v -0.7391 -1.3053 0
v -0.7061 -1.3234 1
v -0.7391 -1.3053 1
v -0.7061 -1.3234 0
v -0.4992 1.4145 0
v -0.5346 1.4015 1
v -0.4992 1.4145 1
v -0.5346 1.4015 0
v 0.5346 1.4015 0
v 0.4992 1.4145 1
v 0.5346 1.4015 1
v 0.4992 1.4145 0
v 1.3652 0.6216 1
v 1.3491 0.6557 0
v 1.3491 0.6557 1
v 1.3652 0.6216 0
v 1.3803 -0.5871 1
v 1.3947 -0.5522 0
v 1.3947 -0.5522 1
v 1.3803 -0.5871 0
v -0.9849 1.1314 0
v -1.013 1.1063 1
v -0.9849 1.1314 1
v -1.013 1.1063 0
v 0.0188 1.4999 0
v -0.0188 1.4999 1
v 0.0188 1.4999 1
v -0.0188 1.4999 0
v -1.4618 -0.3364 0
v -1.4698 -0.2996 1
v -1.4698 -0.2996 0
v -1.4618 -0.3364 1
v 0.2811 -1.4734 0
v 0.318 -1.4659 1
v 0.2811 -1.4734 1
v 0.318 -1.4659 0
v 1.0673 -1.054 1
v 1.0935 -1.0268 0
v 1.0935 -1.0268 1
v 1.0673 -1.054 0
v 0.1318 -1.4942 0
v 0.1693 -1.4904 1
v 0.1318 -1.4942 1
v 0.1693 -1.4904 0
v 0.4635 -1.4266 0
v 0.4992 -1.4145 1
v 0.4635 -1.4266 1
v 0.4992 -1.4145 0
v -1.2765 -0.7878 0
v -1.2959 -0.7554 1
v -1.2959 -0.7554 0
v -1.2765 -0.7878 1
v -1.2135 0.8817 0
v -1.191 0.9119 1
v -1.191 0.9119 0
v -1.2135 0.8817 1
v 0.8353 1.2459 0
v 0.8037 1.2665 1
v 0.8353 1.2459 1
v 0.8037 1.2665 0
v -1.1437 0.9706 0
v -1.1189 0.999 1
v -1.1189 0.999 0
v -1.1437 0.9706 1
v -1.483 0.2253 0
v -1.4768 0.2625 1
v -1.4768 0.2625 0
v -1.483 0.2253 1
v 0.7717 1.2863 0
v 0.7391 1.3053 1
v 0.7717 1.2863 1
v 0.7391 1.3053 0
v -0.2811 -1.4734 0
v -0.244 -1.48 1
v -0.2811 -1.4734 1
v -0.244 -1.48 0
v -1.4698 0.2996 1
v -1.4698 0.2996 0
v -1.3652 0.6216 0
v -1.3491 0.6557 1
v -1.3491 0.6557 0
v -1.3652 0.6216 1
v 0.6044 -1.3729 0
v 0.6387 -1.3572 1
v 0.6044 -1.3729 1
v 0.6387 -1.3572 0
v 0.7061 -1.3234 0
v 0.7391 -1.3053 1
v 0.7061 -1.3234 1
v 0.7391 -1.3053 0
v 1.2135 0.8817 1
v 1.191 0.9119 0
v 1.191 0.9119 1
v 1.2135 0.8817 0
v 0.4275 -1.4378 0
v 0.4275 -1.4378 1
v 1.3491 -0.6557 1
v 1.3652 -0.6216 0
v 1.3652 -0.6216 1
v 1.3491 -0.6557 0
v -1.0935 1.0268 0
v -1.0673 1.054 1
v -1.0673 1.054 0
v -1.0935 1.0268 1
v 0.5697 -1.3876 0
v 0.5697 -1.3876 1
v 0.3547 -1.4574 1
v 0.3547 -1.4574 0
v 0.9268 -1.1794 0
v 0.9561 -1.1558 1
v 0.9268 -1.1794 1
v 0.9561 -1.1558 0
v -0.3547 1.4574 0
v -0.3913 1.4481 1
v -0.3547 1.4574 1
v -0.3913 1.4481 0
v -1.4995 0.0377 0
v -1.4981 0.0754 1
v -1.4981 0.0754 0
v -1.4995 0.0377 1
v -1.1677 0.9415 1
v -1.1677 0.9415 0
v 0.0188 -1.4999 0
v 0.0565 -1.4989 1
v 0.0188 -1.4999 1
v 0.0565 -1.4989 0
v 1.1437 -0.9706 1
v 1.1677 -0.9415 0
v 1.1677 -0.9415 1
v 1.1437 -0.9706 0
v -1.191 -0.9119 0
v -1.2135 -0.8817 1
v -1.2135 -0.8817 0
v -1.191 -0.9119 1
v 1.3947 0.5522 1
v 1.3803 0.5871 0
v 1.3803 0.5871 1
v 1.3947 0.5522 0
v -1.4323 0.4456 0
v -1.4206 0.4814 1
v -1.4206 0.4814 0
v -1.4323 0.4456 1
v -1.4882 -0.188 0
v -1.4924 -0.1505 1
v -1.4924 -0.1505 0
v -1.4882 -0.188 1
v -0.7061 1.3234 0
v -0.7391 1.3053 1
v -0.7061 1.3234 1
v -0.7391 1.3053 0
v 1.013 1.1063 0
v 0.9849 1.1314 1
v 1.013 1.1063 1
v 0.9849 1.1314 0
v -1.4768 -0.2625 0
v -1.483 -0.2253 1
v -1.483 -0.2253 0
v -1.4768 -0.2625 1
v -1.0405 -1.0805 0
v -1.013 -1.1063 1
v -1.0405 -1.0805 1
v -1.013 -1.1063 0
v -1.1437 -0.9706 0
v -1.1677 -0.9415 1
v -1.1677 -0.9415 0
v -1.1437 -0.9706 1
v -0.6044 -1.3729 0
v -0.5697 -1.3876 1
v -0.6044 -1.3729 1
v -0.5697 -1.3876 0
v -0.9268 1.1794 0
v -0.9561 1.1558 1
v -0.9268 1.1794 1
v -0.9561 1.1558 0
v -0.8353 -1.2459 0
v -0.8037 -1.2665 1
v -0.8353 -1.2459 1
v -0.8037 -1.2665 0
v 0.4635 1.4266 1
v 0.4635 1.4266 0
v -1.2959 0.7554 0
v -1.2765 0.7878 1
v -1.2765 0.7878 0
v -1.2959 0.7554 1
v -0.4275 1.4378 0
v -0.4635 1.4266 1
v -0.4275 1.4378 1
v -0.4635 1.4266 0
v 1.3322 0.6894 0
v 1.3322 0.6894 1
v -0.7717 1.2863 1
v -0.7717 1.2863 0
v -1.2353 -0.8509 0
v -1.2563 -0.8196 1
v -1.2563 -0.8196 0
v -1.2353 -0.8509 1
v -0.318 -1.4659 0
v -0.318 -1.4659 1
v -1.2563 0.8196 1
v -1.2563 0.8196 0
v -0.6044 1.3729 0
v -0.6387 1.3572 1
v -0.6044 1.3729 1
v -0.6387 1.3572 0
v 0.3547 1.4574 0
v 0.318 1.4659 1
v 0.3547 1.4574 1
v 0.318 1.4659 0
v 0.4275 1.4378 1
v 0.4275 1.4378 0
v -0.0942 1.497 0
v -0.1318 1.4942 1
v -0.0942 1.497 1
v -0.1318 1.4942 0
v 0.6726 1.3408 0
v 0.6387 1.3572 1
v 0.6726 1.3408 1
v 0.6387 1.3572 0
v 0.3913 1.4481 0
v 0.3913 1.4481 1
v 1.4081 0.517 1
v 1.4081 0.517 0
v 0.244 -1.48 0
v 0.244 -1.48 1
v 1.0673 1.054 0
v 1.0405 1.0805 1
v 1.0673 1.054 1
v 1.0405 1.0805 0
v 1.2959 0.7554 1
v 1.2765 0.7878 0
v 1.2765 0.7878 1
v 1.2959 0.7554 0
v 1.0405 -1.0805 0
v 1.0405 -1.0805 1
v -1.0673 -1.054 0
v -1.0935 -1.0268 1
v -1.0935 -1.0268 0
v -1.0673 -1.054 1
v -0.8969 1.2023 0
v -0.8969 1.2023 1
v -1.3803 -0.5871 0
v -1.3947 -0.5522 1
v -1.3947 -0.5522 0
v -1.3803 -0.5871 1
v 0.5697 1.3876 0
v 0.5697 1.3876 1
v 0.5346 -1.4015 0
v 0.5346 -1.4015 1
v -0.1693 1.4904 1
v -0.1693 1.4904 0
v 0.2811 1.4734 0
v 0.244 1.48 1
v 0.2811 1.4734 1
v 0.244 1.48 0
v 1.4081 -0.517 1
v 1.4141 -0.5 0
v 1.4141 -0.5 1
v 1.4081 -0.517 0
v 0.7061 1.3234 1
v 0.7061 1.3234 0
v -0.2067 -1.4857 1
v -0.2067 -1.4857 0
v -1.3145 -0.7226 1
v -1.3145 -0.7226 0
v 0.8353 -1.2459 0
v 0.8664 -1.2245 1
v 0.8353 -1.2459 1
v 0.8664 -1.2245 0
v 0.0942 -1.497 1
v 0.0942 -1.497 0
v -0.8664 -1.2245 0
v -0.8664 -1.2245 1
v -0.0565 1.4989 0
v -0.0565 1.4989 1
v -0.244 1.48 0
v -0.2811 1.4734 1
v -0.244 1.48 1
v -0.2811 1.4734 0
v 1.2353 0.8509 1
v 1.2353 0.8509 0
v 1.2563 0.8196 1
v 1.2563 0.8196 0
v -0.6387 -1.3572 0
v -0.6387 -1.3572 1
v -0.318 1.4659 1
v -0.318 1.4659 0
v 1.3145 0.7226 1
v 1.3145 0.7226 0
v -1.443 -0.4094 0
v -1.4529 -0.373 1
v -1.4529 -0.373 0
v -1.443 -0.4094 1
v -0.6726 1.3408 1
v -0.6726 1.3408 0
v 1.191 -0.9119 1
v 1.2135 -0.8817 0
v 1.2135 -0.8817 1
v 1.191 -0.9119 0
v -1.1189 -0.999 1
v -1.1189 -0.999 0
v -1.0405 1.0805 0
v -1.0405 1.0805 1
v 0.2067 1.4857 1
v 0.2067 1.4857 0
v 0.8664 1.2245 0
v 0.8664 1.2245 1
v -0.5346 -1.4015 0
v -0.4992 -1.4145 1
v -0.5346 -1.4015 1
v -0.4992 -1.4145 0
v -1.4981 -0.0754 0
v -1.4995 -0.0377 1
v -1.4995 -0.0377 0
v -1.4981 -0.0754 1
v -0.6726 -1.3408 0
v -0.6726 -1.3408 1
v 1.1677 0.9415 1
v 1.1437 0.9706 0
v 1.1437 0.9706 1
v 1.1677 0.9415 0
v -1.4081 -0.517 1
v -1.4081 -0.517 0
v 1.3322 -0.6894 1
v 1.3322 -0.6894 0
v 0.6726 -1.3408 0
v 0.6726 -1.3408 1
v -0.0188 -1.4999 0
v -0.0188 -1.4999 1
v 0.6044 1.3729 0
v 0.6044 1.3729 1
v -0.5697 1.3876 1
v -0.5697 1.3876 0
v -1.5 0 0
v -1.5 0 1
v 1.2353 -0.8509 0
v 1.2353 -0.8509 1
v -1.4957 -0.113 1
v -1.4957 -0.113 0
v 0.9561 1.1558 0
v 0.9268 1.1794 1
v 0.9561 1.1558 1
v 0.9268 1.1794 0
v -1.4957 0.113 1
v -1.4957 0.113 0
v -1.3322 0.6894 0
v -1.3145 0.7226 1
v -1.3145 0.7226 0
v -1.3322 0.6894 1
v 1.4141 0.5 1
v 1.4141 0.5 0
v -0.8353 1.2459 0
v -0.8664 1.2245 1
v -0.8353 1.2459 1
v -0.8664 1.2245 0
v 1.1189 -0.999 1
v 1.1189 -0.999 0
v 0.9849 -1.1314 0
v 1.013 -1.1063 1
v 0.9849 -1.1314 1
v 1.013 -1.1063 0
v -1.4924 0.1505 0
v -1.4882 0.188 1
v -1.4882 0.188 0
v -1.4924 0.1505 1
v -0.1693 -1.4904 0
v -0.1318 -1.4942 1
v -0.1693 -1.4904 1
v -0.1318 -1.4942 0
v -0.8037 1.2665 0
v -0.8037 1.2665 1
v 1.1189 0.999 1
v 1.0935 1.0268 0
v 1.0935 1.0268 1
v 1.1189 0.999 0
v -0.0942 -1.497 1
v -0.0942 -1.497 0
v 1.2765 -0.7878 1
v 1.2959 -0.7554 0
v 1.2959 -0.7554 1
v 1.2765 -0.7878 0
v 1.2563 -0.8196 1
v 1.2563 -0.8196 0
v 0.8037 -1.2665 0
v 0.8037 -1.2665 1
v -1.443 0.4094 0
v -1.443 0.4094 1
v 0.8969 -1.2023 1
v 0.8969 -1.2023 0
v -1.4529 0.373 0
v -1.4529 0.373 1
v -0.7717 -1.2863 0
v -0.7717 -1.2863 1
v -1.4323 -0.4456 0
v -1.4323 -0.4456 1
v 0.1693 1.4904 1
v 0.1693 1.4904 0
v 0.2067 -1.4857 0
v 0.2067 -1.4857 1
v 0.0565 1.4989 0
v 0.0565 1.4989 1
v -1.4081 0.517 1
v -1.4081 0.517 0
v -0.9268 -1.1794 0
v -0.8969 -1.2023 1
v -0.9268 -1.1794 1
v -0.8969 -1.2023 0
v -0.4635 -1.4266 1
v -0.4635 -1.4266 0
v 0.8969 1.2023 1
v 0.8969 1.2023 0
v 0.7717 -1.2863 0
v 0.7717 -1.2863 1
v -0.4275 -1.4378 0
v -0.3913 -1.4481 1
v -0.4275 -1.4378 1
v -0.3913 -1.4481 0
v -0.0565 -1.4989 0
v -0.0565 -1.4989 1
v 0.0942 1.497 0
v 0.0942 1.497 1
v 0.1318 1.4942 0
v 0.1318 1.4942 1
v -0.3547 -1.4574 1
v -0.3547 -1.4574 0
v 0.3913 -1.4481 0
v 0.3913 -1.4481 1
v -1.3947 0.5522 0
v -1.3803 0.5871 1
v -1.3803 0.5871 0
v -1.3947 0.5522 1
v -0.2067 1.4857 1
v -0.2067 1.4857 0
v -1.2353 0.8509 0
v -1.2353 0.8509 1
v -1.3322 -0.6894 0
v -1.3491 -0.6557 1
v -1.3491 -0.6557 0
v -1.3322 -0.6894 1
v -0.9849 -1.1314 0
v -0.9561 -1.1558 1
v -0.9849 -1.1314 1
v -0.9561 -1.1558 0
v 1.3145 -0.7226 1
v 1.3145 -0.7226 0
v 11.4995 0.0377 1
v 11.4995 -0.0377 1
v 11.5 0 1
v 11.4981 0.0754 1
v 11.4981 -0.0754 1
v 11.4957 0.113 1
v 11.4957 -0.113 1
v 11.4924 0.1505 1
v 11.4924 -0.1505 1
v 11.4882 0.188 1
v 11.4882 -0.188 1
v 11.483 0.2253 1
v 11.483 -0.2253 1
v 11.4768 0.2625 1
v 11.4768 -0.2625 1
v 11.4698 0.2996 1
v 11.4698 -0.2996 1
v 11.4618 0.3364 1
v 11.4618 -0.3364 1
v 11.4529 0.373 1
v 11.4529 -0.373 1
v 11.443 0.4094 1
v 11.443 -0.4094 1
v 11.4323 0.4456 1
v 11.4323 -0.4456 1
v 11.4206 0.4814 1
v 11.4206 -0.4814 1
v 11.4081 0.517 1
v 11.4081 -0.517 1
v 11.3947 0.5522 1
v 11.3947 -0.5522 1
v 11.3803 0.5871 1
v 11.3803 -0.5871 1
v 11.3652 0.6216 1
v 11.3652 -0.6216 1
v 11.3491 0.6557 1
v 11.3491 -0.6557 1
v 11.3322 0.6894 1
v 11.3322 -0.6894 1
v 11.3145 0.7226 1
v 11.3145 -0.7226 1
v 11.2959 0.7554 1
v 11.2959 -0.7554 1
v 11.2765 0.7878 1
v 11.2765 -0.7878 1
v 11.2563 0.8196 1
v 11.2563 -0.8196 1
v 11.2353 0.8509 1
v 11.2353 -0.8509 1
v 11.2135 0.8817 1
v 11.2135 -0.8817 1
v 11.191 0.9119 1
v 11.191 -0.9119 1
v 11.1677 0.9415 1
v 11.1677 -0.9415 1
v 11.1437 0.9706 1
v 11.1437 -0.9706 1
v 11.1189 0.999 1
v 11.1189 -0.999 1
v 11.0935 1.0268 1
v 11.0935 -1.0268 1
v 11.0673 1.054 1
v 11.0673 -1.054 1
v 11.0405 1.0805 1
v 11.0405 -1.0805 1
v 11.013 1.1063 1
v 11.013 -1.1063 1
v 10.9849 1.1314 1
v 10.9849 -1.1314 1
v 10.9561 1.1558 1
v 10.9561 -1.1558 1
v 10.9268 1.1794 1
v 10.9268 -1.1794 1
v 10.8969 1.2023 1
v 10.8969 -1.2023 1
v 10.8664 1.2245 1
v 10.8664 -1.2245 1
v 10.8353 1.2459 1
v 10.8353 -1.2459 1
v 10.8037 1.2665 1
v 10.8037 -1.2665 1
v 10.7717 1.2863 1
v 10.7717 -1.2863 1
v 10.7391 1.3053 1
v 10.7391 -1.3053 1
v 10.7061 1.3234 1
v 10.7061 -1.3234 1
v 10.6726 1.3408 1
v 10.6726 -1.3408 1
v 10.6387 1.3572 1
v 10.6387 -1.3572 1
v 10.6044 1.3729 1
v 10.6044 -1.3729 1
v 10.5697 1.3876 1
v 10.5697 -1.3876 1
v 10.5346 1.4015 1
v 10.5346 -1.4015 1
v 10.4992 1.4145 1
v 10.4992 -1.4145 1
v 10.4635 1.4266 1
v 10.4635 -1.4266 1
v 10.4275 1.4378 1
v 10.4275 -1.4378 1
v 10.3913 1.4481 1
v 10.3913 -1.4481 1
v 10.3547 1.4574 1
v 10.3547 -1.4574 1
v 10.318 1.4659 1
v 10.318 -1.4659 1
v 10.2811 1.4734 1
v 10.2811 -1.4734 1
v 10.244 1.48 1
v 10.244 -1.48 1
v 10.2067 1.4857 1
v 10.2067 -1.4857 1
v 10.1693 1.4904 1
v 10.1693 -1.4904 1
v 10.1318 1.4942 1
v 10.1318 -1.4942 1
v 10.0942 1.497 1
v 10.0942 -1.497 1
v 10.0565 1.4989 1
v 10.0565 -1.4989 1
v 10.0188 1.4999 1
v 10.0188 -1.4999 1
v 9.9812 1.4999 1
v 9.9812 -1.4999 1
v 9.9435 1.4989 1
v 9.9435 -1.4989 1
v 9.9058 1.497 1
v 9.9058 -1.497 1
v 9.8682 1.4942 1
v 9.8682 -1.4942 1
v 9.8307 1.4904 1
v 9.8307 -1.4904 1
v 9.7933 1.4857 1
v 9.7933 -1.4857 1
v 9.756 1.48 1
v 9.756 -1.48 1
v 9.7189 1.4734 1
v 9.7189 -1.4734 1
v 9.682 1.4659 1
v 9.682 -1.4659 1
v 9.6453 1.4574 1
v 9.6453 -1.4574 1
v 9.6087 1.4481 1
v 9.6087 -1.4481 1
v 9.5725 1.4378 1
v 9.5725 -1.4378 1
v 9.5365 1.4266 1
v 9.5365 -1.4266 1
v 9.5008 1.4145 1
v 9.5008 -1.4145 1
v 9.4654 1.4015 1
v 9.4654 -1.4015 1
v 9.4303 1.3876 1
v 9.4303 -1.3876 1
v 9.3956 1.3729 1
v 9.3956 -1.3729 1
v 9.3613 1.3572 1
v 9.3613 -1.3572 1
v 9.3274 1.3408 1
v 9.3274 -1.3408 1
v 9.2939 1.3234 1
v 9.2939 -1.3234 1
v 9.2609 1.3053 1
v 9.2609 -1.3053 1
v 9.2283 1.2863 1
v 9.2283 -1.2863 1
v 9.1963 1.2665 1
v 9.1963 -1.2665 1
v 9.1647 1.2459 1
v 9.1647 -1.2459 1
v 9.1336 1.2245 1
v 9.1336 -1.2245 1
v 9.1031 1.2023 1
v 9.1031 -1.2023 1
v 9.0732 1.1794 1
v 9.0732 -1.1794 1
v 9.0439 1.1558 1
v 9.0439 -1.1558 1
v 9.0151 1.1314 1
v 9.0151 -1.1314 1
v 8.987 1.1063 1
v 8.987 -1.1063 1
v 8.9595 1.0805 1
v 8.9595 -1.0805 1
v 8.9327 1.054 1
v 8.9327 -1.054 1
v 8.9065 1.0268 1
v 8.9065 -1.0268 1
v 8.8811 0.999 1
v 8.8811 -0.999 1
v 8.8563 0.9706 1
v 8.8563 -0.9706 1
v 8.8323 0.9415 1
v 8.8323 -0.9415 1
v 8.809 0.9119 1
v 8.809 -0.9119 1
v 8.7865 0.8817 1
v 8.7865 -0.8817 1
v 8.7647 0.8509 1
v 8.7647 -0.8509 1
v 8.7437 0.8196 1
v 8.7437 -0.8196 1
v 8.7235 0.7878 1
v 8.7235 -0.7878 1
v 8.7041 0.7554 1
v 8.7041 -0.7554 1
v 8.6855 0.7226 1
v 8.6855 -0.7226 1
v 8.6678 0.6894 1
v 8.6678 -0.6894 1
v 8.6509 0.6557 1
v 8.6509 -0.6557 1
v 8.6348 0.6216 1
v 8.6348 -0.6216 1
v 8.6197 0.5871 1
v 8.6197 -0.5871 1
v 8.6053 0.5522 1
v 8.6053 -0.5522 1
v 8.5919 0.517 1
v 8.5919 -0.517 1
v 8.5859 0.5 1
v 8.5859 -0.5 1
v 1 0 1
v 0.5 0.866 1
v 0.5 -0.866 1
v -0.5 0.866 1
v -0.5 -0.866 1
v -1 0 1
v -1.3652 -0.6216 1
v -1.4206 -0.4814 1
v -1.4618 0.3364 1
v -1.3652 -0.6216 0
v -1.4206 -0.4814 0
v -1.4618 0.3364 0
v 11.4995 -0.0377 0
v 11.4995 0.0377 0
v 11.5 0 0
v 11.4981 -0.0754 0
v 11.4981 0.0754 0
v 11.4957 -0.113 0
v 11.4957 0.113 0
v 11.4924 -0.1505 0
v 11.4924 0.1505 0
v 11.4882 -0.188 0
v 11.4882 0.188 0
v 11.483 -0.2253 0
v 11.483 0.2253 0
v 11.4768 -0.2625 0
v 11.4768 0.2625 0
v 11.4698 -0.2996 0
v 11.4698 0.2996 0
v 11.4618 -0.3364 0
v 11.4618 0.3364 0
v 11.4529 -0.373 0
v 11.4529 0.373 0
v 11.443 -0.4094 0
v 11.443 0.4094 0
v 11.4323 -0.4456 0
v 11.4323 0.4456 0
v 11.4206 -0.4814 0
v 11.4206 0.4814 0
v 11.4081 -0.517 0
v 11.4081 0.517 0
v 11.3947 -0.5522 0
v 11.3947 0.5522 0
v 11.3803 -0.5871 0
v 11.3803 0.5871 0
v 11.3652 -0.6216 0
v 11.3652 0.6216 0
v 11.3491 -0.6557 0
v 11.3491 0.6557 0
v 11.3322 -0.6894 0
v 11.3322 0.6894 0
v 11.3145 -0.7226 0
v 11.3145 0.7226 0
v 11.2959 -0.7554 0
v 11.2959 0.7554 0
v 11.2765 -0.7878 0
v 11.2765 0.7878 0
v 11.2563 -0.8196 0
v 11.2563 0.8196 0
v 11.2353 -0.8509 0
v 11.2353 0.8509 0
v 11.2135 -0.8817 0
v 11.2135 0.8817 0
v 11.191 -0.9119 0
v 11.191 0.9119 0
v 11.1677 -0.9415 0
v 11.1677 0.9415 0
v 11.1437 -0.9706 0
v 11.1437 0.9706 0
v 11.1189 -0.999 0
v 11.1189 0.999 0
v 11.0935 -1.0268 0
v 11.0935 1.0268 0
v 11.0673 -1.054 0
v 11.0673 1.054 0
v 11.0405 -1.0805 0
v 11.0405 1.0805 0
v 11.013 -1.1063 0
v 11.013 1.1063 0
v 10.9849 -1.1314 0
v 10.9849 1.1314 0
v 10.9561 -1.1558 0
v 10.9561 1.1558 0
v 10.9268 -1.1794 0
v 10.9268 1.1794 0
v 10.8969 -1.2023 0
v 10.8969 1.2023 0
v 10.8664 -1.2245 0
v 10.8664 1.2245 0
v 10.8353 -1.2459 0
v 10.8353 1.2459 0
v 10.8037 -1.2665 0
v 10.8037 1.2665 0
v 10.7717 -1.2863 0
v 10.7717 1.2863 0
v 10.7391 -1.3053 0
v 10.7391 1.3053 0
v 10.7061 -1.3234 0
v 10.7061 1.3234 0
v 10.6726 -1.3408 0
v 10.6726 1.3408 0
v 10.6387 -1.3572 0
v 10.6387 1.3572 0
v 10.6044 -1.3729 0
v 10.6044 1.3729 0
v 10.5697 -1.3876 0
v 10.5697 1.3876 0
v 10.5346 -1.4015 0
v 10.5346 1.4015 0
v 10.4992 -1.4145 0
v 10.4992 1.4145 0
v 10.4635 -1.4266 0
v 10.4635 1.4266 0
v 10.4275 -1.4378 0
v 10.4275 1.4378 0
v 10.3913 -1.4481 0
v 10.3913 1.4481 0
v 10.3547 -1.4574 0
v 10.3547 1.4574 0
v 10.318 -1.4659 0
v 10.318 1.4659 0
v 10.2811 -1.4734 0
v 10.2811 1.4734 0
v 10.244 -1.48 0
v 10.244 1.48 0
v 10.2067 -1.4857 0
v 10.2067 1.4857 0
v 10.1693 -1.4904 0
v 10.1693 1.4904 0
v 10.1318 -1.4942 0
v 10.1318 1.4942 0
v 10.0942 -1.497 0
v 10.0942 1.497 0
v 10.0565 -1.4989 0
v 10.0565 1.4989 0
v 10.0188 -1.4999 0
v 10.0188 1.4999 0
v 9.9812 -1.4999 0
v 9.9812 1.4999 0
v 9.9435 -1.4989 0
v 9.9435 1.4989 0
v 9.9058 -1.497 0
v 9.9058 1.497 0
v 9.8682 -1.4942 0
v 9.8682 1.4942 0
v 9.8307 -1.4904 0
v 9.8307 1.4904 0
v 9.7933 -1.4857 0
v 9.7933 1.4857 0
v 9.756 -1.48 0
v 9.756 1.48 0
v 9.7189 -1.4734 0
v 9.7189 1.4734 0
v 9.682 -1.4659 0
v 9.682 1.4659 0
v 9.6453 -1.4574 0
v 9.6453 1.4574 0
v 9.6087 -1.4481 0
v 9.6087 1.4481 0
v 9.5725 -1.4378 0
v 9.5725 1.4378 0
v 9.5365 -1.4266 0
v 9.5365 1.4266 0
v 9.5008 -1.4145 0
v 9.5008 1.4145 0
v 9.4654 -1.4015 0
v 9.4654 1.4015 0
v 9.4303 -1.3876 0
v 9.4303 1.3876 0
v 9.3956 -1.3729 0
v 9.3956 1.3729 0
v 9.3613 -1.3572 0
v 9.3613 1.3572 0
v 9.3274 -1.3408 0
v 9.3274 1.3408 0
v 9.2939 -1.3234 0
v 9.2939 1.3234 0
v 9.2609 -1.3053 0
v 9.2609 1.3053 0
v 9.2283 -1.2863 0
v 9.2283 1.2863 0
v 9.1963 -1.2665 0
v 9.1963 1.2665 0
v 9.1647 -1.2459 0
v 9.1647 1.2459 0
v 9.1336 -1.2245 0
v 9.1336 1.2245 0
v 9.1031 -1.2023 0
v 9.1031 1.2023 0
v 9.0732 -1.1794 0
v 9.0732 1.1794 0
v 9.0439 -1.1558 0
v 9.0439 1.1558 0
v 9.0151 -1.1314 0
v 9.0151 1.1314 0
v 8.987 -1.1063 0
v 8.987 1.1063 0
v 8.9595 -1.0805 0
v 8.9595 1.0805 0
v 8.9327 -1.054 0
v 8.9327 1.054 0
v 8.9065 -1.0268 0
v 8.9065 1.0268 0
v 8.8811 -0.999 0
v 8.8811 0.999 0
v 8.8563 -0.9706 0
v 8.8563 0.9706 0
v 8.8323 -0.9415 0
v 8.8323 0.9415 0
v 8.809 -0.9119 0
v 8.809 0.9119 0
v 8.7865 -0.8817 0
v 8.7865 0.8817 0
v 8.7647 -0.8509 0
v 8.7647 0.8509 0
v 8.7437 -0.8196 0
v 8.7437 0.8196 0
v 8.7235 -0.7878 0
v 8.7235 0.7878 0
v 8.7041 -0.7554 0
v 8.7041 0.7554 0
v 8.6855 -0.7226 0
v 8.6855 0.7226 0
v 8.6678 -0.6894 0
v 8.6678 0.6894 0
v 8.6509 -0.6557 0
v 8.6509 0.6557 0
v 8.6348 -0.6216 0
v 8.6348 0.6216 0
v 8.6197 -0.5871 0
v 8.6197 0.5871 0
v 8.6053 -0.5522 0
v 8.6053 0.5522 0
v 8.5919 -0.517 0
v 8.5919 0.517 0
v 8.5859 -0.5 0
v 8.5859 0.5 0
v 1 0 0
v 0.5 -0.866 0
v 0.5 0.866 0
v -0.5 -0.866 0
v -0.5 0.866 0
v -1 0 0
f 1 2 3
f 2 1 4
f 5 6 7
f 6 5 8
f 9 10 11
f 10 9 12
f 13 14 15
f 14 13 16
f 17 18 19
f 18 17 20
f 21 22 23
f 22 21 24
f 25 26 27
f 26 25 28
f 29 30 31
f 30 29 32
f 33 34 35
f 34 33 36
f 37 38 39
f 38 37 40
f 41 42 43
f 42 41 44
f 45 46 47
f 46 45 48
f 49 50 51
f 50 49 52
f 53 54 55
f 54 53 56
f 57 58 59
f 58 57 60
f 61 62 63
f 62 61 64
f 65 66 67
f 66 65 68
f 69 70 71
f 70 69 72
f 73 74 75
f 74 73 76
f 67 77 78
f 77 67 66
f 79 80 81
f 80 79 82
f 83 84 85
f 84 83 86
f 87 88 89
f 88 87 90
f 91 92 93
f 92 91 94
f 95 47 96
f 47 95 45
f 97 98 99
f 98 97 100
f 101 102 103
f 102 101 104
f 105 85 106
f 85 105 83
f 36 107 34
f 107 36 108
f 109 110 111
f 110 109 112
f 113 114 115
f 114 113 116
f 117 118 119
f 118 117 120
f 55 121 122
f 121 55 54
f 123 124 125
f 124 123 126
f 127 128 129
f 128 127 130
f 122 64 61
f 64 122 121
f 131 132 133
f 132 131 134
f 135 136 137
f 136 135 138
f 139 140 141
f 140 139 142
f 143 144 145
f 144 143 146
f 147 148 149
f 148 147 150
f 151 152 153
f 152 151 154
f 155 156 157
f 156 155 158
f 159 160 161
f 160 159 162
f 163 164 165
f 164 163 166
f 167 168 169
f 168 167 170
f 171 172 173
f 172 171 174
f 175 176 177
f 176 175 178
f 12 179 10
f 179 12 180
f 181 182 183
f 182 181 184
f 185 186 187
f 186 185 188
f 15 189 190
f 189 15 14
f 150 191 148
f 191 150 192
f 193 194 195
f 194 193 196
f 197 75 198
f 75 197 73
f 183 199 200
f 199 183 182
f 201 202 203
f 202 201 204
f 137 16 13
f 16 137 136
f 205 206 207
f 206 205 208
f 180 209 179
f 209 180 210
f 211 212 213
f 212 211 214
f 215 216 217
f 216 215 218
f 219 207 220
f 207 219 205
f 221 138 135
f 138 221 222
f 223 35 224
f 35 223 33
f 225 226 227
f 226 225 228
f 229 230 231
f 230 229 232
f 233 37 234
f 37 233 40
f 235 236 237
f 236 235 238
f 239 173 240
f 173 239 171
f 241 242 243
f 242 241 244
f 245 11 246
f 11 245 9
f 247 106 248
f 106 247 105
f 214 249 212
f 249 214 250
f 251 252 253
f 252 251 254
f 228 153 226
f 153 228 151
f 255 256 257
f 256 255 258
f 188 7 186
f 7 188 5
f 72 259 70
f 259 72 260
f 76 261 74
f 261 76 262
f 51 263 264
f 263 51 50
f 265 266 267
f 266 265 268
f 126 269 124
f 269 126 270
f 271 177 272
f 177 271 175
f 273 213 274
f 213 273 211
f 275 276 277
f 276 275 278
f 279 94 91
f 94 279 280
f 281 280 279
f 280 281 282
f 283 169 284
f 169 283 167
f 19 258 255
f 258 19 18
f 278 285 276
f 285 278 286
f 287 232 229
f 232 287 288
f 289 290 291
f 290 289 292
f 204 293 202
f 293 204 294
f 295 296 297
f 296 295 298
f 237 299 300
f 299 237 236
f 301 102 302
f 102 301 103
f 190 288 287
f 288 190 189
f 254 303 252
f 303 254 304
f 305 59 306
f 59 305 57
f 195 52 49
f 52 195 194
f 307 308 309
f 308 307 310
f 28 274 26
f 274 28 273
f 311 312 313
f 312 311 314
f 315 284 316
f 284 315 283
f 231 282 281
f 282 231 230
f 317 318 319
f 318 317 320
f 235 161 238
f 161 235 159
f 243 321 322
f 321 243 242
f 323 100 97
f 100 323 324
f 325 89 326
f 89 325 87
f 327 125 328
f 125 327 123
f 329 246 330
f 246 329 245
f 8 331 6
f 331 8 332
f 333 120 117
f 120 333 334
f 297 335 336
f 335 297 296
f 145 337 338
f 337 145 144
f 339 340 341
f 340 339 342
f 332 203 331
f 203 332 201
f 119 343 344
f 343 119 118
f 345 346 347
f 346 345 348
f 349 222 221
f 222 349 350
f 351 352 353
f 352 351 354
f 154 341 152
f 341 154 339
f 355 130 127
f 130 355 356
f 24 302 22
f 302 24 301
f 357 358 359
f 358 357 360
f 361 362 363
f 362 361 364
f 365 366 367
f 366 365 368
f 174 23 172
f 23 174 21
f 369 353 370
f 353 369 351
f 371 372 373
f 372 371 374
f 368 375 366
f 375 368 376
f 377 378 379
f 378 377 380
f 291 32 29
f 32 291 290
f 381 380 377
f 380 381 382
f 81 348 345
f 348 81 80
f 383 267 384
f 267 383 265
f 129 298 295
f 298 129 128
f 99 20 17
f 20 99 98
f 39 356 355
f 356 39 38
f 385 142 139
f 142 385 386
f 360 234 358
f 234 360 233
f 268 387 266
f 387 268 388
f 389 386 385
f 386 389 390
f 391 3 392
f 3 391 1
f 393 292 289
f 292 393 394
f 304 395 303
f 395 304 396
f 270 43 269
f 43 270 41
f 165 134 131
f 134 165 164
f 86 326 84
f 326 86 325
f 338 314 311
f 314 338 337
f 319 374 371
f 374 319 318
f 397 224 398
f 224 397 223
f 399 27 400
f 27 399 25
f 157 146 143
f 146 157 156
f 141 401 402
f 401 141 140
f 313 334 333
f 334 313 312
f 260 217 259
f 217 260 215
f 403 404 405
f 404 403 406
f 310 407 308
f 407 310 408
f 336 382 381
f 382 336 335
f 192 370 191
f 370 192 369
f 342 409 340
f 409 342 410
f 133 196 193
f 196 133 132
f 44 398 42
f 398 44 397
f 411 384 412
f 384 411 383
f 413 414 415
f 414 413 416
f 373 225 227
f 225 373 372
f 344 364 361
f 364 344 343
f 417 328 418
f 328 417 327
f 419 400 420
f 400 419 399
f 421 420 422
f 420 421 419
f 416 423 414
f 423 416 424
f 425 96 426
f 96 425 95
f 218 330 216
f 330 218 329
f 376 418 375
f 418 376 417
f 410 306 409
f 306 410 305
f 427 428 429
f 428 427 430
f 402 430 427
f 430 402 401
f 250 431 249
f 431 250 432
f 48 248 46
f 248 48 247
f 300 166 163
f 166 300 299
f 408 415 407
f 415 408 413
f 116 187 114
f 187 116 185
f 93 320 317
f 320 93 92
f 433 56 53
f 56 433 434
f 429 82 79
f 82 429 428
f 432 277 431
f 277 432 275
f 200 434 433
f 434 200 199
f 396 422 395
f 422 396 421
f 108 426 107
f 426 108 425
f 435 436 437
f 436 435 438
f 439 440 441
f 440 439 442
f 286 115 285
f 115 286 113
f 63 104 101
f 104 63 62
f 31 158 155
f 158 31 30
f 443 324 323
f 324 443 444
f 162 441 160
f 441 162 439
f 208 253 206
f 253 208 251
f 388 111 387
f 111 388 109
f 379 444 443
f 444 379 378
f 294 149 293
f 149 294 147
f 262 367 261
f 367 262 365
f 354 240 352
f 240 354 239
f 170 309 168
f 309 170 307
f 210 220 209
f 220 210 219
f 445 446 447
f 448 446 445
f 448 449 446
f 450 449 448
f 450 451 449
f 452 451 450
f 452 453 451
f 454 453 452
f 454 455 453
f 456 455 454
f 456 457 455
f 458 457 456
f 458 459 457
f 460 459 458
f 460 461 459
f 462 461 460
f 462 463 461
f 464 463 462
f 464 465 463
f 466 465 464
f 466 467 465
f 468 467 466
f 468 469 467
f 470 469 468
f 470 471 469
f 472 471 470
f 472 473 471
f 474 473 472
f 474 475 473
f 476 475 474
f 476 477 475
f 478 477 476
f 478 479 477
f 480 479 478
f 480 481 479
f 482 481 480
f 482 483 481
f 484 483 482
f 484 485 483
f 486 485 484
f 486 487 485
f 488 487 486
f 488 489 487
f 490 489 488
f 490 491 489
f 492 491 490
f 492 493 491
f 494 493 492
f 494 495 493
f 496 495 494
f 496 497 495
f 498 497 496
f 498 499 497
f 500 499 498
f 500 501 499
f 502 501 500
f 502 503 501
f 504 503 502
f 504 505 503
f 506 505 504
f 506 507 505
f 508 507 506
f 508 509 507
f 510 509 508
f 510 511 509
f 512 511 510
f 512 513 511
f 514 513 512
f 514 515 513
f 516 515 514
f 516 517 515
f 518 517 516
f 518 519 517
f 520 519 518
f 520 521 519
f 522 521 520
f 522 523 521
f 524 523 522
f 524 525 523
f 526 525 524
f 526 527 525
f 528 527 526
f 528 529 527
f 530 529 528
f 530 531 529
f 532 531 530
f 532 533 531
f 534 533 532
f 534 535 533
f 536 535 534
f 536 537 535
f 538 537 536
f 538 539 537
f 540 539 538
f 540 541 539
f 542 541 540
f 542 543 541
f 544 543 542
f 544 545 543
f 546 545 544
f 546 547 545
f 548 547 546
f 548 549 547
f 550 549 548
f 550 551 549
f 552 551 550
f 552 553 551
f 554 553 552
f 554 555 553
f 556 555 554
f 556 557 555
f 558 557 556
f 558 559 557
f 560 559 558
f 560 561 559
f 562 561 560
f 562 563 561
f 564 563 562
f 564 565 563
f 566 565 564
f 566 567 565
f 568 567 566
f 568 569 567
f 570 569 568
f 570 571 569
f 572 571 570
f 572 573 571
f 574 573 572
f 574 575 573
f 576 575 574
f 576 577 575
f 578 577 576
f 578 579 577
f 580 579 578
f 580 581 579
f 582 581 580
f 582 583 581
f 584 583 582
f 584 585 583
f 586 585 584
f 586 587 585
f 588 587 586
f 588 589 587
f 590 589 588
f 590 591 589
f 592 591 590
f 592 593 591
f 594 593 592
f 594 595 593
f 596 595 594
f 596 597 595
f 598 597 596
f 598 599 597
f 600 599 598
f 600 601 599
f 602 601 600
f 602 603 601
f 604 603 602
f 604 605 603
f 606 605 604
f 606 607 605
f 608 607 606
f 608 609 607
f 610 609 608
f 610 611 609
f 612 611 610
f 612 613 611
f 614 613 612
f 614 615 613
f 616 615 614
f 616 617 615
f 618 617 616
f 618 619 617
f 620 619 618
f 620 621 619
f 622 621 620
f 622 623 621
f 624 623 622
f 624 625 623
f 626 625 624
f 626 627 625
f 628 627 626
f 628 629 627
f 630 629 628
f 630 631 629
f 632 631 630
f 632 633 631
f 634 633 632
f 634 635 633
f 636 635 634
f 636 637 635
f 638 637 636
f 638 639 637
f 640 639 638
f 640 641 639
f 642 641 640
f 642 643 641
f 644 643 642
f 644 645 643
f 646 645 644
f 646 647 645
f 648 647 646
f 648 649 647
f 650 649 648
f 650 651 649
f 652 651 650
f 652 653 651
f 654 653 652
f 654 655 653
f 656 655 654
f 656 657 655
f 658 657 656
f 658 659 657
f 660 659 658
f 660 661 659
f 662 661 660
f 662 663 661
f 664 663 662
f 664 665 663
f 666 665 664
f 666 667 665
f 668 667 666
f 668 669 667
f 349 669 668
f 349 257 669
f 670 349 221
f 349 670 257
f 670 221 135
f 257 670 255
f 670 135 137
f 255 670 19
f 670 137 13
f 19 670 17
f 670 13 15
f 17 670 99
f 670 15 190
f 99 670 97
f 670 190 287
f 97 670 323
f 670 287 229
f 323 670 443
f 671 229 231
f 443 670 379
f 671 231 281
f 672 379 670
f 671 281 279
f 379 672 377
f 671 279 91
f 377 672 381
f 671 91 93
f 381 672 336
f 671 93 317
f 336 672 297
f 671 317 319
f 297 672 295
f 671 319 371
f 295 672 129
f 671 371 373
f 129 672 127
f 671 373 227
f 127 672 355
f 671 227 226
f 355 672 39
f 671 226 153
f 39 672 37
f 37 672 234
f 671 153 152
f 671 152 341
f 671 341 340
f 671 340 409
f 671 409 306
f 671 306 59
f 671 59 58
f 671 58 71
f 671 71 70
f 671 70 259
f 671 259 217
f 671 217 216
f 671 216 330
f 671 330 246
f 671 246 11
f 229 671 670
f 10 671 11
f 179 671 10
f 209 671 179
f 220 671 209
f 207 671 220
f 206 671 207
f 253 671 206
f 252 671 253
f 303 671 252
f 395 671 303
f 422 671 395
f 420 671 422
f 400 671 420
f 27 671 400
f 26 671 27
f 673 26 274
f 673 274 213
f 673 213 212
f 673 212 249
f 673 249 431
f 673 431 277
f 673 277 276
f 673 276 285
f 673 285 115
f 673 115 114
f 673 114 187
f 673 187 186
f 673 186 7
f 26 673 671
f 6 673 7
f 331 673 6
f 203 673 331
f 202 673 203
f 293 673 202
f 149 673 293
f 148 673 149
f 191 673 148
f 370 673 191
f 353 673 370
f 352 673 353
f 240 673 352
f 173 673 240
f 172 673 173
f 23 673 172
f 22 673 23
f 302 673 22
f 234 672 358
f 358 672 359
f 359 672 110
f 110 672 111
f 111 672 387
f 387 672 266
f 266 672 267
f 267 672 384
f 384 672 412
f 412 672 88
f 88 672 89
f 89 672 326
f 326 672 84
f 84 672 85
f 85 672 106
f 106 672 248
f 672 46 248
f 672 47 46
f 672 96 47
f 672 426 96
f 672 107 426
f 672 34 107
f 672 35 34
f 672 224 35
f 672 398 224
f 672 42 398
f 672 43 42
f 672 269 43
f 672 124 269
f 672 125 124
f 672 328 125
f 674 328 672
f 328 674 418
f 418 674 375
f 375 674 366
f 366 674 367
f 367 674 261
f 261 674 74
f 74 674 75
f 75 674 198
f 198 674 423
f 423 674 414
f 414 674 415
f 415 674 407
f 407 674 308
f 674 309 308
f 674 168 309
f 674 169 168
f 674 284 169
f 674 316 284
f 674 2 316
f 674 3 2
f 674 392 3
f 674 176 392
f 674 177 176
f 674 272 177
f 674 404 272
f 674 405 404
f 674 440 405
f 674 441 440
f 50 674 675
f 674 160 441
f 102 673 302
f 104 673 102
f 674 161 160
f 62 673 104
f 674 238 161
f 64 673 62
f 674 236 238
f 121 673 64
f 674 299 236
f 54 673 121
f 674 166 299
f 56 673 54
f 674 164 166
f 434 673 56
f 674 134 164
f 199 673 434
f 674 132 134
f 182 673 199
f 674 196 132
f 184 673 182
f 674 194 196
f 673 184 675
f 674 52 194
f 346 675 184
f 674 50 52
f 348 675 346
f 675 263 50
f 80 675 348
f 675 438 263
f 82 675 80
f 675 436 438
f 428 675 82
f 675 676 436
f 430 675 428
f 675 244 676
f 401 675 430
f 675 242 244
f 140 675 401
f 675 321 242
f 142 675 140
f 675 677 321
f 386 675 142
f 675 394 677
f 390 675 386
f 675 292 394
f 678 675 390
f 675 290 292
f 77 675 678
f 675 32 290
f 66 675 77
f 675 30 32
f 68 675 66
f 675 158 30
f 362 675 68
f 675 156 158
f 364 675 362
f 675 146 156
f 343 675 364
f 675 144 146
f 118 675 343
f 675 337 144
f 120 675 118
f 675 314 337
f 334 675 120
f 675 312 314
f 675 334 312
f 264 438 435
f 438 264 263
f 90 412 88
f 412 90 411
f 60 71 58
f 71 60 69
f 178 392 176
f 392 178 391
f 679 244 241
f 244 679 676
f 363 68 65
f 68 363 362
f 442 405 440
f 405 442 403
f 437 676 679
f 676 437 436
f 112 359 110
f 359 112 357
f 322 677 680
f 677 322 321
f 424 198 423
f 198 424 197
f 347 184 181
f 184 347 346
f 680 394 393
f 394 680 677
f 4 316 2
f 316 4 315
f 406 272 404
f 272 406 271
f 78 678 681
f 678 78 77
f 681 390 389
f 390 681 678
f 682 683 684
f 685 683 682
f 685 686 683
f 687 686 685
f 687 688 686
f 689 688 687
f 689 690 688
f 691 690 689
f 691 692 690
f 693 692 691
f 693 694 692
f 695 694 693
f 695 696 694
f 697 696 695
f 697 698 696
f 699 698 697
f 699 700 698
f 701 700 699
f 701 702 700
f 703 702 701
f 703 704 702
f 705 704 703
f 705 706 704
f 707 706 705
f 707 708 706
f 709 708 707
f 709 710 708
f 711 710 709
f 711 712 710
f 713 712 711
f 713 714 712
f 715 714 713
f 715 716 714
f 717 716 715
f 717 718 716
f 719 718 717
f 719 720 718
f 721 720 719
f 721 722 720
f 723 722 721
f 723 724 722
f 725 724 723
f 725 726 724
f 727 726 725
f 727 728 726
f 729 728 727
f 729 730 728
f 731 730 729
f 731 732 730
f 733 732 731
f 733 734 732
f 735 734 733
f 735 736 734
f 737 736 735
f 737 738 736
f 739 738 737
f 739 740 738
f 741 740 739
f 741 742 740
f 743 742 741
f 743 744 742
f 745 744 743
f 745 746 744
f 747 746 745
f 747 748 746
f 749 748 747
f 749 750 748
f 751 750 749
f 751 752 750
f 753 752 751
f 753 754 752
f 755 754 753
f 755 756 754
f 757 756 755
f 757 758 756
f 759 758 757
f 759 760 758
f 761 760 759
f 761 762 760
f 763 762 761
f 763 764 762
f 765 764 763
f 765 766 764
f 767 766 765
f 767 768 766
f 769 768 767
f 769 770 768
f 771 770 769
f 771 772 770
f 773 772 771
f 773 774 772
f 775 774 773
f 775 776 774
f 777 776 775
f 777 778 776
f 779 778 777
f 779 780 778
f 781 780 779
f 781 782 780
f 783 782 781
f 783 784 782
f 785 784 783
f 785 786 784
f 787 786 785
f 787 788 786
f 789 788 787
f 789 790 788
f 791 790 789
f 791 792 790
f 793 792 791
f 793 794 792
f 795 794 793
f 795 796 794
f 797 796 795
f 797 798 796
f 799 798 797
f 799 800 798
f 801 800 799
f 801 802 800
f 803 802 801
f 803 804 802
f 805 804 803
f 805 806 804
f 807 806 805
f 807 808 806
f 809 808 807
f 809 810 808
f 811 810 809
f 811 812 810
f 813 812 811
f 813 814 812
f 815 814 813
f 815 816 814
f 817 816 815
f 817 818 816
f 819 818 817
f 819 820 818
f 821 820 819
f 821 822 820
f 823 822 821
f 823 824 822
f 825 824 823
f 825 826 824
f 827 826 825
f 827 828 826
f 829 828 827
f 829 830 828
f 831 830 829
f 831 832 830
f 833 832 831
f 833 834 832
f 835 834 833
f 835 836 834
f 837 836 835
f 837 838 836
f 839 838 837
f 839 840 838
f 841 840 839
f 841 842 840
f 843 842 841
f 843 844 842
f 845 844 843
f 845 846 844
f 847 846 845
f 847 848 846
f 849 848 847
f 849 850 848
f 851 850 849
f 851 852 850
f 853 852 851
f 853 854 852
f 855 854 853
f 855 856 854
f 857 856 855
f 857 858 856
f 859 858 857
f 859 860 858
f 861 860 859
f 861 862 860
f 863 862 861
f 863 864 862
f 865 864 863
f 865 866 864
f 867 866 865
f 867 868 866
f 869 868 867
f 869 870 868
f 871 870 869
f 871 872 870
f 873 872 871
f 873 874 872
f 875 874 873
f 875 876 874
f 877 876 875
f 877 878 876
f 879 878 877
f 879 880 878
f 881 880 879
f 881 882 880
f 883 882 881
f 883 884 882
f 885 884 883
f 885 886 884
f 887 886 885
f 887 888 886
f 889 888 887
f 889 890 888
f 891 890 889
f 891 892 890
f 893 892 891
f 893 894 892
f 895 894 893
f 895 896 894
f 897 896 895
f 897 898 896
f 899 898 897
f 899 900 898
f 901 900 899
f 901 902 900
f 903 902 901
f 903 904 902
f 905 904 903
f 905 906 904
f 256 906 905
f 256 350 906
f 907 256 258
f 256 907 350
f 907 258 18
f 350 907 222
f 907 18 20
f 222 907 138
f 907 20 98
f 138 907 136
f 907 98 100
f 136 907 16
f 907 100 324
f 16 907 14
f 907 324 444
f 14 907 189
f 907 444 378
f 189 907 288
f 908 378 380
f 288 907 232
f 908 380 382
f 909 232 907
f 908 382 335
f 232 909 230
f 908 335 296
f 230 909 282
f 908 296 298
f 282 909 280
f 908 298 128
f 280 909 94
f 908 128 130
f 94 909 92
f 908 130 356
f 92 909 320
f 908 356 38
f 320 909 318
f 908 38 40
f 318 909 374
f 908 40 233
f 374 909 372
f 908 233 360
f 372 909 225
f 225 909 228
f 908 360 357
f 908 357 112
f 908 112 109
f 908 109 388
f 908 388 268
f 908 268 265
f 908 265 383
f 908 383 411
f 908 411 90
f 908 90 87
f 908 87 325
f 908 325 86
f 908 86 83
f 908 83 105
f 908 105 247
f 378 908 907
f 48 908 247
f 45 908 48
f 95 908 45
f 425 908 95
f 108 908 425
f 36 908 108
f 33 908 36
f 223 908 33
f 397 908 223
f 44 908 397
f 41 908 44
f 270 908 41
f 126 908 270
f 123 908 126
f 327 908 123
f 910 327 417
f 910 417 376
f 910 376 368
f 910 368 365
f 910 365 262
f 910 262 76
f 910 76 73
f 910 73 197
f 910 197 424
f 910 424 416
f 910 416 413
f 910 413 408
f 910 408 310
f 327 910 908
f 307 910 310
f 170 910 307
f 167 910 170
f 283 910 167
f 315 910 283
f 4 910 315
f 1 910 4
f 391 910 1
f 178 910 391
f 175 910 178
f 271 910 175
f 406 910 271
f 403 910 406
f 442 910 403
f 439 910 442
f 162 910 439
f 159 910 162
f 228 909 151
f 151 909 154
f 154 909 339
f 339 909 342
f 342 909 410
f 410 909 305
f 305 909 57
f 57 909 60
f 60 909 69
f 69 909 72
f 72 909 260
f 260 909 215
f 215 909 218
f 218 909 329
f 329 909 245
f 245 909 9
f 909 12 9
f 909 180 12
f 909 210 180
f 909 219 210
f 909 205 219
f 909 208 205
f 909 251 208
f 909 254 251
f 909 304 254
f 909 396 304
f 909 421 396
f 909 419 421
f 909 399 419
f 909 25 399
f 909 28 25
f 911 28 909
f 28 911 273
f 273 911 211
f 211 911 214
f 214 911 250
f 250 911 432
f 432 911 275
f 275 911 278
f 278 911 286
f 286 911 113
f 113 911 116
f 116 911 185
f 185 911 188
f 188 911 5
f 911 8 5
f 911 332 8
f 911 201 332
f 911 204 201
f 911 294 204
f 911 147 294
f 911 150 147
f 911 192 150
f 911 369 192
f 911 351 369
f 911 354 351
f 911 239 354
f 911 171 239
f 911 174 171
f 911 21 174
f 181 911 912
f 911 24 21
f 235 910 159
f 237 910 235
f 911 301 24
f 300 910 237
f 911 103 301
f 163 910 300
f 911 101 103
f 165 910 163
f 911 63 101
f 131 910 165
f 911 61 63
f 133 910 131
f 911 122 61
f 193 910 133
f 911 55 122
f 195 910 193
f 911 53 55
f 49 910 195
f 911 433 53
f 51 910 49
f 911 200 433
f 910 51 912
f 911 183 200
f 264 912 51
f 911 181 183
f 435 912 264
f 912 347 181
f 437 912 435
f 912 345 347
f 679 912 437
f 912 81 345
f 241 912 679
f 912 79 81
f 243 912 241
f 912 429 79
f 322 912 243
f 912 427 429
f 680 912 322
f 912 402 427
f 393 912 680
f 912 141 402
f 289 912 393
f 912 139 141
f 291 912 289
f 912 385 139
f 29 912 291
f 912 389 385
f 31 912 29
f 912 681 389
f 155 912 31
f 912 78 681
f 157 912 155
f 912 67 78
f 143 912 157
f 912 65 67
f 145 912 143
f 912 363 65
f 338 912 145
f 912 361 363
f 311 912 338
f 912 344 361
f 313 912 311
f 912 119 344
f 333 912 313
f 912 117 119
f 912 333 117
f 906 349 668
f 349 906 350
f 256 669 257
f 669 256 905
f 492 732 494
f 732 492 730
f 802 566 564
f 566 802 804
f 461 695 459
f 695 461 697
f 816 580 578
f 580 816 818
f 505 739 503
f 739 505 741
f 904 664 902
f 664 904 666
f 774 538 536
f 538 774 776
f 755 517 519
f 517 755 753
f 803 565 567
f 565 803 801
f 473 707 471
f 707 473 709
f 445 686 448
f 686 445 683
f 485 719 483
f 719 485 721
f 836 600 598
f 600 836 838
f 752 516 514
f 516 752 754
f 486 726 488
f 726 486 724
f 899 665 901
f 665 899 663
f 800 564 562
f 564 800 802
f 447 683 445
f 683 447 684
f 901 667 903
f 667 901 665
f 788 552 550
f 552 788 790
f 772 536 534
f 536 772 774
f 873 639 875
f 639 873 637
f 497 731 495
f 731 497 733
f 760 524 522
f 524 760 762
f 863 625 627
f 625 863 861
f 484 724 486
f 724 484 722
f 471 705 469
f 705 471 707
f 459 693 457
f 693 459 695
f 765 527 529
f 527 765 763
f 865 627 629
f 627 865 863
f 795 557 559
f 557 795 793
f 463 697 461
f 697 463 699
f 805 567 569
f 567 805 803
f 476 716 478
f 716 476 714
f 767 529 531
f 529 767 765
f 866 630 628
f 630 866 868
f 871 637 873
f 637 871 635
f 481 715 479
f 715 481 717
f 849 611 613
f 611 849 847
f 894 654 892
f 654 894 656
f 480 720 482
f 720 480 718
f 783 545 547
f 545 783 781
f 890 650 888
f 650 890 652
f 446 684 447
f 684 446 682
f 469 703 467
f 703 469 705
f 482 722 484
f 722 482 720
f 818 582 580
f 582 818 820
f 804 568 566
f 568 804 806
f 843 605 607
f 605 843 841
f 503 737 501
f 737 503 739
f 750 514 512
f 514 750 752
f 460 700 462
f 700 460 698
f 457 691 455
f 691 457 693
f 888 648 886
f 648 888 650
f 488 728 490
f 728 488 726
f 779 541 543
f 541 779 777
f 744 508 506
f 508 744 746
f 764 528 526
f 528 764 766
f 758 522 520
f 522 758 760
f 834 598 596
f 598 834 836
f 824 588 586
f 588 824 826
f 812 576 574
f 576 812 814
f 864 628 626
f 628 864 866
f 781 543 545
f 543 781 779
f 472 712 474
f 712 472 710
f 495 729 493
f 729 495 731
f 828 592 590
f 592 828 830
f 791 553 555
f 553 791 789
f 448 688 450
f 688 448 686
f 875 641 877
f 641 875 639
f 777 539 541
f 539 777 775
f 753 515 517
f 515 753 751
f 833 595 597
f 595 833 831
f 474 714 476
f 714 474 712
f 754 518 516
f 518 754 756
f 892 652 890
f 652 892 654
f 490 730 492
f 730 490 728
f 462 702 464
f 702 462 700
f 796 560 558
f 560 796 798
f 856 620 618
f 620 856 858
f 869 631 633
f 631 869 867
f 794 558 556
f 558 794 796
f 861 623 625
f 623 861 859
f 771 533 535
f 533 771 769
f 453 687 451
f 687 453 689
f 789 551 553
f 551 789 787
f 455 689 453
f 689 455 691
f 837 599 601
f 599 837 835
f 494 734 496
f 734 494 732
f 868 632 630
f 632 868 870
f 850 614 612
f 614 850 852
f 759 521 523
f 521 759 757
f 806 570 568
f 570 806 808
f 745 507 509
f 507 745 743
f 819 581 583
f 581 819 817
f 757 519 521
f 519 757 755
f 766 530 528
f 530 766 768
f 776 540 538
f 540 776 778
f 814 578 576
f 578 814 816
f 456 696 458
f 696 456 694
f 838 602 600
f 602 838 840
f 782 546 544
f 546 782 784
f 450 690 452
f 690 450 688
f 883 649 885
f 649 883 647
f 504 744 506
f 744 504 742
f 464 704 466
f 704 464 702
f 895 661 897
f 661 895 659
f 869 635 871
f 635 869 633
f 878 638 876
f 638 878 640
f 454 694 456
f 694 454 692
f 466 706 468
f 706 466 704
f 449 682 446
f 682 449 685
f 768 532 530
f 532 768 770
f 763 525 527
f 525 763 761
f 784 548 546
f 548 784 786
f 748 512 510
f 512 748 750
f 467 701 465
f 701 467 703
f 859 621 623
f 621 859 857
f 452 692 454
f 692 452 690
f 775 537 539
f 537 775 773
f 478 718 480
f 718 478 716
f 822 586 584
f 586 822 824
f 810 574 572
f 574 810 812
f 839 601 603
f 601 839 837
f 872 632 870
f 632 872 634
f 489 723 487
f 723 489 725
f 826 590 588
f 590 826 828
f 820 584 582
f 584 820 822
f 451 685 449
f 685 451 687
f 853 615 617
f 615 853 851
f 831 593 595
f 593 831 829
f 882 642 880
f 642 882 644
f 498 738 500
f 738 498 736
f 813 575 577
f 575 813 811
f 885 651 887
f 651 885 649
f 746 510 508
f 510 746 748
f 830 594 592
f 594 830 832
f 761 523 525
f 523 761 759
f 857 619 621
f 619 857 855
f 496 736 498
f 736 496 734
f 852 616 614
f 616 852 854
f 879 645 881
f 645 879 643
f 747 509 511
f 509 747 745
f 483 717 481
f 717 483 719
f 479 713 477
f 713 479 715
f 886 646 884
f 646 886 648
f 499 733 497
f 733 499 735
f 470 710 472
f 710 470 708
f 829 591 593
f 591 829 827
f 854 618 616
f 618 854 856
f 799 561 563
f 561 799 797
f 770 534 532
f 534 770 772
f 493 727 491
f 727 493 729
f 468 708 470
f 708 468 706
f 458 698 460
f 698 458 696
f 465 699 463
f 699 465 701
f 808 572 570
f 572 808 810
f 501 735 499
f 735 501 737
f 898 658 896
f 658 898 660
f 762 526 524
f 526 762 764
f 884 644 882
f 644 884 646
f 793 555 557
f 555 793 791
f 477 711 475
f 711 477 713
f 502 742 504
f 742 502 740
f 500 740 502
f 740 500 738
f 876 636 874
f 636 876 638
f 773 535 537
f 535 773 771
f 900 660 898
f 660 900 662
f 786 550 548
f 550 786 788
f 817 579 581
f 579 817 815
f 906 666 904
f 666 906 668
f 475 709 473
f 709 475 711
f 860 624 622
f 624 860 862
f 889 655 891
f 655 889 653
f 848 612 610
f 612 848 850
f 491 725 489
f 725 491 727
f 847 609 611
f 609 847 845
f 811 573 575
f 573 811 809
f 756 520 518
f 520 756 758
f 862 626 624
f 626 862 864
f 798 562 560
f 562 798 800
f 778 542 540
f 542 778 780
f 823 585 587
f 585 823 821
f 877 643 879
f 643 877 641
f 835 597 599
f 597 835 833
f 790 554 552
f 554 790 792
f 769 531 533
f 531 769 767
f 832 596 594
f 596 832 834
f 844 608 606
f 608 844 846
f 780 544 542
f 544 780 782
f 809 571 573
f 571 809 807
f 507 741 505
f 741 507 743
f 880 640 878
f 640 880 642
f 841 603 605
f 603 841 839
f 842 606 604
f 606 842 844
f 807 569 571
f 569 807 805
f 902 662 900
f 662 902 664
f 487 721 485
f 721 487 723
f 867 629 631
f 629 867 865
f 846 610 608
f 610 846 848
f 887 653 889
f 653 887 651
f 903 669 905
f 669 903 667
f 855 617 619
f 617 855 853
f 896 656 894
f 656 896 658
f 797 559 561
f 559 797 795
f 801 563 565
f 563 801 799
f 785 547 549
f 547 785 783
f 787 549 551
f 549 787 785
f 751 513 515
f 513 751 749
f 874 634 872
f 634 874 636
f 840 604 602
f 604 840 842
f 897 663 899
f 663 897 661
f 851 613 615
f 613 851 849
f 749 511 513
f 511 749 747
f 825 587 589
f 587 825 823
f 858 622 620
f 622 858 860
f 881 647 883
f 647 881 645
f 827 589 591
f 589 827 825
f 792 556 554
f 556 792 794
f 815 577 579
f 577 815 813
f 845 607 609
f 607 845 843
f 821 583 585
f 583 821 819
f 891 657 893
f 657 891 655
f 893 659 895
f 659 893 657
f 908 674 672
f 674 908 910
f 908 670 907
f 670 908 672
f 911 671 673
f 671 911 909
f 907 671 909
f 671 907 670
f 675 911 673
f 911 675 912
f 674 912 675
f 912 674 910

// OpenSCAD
$fn = 250;
eps = 0.01;
eps_2 = 0.005;
ROUNDING_D = 2.5;
SH_SIZE = 10;
HOLE_DEPTH = 1.5;
    
module round_square(diam = ROUNDING_D, a = SH_SIZE, h = HOLE_DEPTH)
{
    _d = diam;
    _a = a-diam;
    _h = h;
    
    translate([_d/2,_d/2,0])
    hull()
    {
        cylinder(d = _d, h = _h);
        translate([_a,0,0]) cylinder(d = _d, h = _h);
        translate([0,_a,0]) cylinder(d = _d, h = _h);
        translate([_a,_a,0]) cylinder(d = _d, h = _h);
       
    }
    
}

module spanner(nut_d = 2, l = 10, h = 1, t = 1)
{
    d = nut_d*1.5;
    difference()
    {
        union()
        {
            cylinder(d=d,h=h);
            translate([0,-t/2,0]) cube([l,t,h]);
            translate([l,0,0]) cylinder(d=d,h=h);    
        }
        translate([[ 11.28, -10.41, -16.17 ]]) cylinder(d=nut_d,h=h, $fn = 6);
        //translate([-nut_d/2,0,0]) cylinder(d=nut_d,h=h, $fn = 6);
    }
    
}

module base()
{
    round_square();
}

//base();
spanner();
